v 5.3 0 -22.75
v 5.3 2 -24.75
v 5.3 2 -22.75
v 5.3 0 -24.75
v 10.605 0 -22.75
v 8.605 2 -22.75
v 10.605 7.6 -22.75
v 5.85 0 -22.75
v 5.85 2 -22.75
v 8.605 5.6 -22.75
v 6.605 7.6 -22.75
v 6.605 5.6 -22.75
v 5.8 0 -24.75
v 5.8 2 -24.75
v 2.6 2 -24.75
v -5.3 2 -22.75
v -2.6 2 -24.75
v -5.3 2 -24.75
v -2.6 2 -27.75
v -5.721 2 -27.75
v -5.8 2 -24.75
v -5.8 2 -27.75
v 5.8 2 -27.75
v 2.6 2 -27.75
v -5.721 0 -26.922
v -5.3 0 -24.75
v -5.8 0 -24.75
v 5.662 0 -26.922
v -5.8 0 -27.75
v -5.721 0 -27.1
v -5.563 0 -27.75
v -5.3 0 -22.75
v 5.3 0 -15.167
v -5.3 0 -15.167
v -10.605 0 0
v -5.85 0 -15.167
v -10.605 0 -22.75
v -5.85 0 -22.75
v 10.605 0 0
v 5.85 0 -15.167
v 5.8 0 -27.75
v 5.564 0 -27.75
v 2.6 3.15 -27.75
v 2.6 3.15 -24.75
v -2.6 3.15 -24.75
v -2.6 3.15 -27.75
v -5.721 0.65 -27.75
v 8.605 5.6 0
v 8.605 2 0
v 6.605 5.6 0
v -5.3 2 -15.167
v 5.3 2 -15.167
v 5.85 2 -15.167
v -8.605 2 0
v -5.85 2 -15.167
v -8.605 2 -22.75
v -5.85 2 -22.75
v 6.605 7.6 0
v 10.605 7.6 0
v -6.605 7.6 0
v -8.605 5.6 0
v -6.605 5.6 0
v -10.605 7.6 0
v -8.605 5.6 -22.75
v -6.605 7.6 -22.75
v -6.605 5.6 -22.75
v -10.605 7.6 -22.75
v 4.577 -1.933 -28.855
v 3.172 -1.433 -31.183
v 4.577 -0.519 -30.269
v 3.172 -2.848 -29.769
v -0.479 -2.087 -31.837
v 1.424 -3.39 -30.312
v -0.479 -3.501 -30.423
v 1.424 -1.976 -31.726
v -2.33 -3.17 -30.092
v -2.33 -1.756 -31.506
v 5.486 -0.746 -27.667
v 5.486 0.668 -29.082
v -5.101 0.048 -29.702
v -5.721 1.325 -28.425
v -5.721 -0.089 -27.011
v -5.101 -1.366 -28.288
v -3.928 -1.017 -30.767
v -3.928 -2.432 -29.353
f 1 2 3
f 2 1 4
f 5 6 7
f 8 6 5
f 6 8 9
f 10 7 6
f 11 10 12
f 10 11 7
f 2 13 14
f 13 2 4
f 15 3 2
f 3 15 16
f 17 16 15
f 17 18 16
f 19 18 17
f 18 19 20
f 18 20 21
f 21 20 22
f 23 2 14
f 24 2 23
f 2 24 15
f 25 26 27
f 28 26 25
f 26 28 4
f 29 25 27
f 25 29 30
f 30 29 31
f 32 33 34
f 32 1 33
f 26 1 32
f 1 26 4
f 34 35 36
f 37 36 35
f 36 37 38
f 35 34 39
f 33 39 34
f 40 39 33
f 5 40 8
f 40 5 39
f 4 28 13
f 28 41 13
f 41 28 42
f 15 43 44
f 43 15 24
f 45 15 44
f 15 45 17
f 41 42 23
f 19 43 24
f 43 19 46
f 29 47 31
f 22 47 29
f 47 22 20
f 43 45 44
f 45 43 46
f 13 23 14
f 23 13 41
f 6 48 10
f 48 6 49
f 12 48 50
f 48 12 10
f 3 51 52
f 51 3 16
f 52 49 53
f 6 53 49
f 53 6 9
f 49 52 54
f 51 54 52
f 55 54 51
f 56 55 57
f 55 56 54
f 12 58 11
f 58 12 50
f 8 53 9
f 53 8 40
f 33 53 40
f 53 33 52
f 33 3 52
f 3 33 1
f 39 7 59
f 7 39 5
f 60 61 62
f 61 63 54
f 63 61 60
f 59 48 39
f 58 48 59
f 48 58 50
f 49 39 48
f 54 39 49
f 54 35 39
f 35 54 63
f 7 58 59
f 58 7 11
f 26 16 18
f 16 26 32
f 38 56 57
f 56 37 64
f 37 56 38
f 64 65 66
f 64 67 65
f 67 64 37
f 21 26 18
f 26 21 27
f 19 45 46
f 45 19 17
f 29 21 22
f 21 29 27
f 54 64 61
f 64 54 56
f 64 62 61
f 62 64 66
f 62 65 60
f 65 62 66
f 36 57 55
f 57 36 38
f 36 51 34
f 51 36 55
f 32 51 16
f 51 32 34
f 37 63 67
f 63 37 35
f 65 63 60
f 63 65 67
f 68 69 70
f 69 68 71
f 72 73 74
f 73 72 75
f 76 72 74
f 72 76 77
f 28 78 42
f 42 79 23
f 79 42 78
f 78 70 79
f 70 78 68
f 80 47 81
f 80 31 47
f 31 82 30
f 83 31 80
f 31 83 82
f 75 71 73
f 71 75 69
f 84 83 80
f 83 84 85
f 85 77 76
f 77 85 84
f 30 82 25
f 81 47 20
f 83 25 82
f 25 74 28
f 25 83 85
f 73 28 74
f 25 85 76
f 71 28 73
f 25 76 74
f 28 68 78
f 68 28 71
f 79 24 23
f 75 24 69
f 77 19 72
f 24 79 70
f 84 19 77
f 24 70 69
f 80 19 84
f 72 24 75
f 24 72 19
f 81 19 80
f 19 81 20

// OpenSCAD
// [FL_INDEX: keywords="openscad, 3d_parametric, Holder_for_chinese_bike_lane_laser__female, csg_solid" | COT="Parametric OpenSCAD design from 3DCodeverse"]
// Title: Holder for chinese bike lane laser, female

// ===== file: chinese_laser.scad =====
// preview[view:northwest, tilt:bottomdiagonal]

/* [holder chinese laser] */

// min width of the plastic walls.
wall = 2; // plastic walls are 2mm

// we will model the whole thing based on the hole in the middle, since that is all we care about. It should be the measured from the male part on the bike light you want to attach here.
innerWidth = 17.21; // the side to side of the shaft
innerDepth = 3.6; // the depth the shaft
// height does not matter much for the male part, as it will pass trhu the whole part. So just enter a good height so that it reaches the latch on the bottom.
partHeight = 22.75;
// width of the thumb thing for the latch
handle_width = 11.6;

module main_part(){
	latch();
	difference(){
		// the main block where we will chip the pieces away
		cube([ innerWidth/2 + wall, innerDepth+wall*2 , partHeight] );
		main_cuts();
	}
}
module latch(){
	// bottom latch
	translate([ 0, 0, -wall ] ){
		cube( [ handle_width/2 -0.5, wall, wall] );
	}
	// the latching block
	translate([ 0, wall, -3-wall ] ){
		cube( [ 5.20/2, 1.15, 3] );
	}
	// the lachking block base
	translate([ 0, 0, -3-wall ] ){
		cube( [ handle_width/2, wall, 3] );
	}
	//handle();
}
module handle(){
	// the handle
	translate([ 0, wall, -3-wall ] ){
		rotate([45, 0, 0])
			difference(){
				cylinder( h=wall, r=handle_width/2);
				color("blue") rotate([0,0,90])
					translate([0, -handle_width/2-0.001,-0.001])
						cube([ handle_width/2+0.002, handle_width+0.002 , handle_width+0.002]);
			}
	}

}

module main_cuts(){
	// the inner shaft
	translate( [ -0.001, wall, -0.001] ){
		cube([ innerWidth/2+0.001, innerDepth, partHeight+0.002] );
	}
	// the front wall opening
	translate( [ -0.001, (wall)+innerDepth-0.001, -0.001] ){
		cube([ innerWidth/2-wall+0.001, wall+0.002, partHeight+0.002] );
	}
	// the two cuts on the side leading to the latch so that it can move back/forth
	translate( [ handle_width/2-0.5, -0.001, -0.001] ){
		cube([ 0.55, wall+0.002, partHeight/3+0.001]);
	}
}

main();
module main(){
	translate([0,0,-partHeight]){
		main_part();
		actual_mirror();
		handle();
	}
}

// mirror the geometry... why the fuck mirror does not copy? that way it is just an alias to rotate()
module actual_mirror(){
	mirror([10,0,0]){
		main_part();
	}
}
